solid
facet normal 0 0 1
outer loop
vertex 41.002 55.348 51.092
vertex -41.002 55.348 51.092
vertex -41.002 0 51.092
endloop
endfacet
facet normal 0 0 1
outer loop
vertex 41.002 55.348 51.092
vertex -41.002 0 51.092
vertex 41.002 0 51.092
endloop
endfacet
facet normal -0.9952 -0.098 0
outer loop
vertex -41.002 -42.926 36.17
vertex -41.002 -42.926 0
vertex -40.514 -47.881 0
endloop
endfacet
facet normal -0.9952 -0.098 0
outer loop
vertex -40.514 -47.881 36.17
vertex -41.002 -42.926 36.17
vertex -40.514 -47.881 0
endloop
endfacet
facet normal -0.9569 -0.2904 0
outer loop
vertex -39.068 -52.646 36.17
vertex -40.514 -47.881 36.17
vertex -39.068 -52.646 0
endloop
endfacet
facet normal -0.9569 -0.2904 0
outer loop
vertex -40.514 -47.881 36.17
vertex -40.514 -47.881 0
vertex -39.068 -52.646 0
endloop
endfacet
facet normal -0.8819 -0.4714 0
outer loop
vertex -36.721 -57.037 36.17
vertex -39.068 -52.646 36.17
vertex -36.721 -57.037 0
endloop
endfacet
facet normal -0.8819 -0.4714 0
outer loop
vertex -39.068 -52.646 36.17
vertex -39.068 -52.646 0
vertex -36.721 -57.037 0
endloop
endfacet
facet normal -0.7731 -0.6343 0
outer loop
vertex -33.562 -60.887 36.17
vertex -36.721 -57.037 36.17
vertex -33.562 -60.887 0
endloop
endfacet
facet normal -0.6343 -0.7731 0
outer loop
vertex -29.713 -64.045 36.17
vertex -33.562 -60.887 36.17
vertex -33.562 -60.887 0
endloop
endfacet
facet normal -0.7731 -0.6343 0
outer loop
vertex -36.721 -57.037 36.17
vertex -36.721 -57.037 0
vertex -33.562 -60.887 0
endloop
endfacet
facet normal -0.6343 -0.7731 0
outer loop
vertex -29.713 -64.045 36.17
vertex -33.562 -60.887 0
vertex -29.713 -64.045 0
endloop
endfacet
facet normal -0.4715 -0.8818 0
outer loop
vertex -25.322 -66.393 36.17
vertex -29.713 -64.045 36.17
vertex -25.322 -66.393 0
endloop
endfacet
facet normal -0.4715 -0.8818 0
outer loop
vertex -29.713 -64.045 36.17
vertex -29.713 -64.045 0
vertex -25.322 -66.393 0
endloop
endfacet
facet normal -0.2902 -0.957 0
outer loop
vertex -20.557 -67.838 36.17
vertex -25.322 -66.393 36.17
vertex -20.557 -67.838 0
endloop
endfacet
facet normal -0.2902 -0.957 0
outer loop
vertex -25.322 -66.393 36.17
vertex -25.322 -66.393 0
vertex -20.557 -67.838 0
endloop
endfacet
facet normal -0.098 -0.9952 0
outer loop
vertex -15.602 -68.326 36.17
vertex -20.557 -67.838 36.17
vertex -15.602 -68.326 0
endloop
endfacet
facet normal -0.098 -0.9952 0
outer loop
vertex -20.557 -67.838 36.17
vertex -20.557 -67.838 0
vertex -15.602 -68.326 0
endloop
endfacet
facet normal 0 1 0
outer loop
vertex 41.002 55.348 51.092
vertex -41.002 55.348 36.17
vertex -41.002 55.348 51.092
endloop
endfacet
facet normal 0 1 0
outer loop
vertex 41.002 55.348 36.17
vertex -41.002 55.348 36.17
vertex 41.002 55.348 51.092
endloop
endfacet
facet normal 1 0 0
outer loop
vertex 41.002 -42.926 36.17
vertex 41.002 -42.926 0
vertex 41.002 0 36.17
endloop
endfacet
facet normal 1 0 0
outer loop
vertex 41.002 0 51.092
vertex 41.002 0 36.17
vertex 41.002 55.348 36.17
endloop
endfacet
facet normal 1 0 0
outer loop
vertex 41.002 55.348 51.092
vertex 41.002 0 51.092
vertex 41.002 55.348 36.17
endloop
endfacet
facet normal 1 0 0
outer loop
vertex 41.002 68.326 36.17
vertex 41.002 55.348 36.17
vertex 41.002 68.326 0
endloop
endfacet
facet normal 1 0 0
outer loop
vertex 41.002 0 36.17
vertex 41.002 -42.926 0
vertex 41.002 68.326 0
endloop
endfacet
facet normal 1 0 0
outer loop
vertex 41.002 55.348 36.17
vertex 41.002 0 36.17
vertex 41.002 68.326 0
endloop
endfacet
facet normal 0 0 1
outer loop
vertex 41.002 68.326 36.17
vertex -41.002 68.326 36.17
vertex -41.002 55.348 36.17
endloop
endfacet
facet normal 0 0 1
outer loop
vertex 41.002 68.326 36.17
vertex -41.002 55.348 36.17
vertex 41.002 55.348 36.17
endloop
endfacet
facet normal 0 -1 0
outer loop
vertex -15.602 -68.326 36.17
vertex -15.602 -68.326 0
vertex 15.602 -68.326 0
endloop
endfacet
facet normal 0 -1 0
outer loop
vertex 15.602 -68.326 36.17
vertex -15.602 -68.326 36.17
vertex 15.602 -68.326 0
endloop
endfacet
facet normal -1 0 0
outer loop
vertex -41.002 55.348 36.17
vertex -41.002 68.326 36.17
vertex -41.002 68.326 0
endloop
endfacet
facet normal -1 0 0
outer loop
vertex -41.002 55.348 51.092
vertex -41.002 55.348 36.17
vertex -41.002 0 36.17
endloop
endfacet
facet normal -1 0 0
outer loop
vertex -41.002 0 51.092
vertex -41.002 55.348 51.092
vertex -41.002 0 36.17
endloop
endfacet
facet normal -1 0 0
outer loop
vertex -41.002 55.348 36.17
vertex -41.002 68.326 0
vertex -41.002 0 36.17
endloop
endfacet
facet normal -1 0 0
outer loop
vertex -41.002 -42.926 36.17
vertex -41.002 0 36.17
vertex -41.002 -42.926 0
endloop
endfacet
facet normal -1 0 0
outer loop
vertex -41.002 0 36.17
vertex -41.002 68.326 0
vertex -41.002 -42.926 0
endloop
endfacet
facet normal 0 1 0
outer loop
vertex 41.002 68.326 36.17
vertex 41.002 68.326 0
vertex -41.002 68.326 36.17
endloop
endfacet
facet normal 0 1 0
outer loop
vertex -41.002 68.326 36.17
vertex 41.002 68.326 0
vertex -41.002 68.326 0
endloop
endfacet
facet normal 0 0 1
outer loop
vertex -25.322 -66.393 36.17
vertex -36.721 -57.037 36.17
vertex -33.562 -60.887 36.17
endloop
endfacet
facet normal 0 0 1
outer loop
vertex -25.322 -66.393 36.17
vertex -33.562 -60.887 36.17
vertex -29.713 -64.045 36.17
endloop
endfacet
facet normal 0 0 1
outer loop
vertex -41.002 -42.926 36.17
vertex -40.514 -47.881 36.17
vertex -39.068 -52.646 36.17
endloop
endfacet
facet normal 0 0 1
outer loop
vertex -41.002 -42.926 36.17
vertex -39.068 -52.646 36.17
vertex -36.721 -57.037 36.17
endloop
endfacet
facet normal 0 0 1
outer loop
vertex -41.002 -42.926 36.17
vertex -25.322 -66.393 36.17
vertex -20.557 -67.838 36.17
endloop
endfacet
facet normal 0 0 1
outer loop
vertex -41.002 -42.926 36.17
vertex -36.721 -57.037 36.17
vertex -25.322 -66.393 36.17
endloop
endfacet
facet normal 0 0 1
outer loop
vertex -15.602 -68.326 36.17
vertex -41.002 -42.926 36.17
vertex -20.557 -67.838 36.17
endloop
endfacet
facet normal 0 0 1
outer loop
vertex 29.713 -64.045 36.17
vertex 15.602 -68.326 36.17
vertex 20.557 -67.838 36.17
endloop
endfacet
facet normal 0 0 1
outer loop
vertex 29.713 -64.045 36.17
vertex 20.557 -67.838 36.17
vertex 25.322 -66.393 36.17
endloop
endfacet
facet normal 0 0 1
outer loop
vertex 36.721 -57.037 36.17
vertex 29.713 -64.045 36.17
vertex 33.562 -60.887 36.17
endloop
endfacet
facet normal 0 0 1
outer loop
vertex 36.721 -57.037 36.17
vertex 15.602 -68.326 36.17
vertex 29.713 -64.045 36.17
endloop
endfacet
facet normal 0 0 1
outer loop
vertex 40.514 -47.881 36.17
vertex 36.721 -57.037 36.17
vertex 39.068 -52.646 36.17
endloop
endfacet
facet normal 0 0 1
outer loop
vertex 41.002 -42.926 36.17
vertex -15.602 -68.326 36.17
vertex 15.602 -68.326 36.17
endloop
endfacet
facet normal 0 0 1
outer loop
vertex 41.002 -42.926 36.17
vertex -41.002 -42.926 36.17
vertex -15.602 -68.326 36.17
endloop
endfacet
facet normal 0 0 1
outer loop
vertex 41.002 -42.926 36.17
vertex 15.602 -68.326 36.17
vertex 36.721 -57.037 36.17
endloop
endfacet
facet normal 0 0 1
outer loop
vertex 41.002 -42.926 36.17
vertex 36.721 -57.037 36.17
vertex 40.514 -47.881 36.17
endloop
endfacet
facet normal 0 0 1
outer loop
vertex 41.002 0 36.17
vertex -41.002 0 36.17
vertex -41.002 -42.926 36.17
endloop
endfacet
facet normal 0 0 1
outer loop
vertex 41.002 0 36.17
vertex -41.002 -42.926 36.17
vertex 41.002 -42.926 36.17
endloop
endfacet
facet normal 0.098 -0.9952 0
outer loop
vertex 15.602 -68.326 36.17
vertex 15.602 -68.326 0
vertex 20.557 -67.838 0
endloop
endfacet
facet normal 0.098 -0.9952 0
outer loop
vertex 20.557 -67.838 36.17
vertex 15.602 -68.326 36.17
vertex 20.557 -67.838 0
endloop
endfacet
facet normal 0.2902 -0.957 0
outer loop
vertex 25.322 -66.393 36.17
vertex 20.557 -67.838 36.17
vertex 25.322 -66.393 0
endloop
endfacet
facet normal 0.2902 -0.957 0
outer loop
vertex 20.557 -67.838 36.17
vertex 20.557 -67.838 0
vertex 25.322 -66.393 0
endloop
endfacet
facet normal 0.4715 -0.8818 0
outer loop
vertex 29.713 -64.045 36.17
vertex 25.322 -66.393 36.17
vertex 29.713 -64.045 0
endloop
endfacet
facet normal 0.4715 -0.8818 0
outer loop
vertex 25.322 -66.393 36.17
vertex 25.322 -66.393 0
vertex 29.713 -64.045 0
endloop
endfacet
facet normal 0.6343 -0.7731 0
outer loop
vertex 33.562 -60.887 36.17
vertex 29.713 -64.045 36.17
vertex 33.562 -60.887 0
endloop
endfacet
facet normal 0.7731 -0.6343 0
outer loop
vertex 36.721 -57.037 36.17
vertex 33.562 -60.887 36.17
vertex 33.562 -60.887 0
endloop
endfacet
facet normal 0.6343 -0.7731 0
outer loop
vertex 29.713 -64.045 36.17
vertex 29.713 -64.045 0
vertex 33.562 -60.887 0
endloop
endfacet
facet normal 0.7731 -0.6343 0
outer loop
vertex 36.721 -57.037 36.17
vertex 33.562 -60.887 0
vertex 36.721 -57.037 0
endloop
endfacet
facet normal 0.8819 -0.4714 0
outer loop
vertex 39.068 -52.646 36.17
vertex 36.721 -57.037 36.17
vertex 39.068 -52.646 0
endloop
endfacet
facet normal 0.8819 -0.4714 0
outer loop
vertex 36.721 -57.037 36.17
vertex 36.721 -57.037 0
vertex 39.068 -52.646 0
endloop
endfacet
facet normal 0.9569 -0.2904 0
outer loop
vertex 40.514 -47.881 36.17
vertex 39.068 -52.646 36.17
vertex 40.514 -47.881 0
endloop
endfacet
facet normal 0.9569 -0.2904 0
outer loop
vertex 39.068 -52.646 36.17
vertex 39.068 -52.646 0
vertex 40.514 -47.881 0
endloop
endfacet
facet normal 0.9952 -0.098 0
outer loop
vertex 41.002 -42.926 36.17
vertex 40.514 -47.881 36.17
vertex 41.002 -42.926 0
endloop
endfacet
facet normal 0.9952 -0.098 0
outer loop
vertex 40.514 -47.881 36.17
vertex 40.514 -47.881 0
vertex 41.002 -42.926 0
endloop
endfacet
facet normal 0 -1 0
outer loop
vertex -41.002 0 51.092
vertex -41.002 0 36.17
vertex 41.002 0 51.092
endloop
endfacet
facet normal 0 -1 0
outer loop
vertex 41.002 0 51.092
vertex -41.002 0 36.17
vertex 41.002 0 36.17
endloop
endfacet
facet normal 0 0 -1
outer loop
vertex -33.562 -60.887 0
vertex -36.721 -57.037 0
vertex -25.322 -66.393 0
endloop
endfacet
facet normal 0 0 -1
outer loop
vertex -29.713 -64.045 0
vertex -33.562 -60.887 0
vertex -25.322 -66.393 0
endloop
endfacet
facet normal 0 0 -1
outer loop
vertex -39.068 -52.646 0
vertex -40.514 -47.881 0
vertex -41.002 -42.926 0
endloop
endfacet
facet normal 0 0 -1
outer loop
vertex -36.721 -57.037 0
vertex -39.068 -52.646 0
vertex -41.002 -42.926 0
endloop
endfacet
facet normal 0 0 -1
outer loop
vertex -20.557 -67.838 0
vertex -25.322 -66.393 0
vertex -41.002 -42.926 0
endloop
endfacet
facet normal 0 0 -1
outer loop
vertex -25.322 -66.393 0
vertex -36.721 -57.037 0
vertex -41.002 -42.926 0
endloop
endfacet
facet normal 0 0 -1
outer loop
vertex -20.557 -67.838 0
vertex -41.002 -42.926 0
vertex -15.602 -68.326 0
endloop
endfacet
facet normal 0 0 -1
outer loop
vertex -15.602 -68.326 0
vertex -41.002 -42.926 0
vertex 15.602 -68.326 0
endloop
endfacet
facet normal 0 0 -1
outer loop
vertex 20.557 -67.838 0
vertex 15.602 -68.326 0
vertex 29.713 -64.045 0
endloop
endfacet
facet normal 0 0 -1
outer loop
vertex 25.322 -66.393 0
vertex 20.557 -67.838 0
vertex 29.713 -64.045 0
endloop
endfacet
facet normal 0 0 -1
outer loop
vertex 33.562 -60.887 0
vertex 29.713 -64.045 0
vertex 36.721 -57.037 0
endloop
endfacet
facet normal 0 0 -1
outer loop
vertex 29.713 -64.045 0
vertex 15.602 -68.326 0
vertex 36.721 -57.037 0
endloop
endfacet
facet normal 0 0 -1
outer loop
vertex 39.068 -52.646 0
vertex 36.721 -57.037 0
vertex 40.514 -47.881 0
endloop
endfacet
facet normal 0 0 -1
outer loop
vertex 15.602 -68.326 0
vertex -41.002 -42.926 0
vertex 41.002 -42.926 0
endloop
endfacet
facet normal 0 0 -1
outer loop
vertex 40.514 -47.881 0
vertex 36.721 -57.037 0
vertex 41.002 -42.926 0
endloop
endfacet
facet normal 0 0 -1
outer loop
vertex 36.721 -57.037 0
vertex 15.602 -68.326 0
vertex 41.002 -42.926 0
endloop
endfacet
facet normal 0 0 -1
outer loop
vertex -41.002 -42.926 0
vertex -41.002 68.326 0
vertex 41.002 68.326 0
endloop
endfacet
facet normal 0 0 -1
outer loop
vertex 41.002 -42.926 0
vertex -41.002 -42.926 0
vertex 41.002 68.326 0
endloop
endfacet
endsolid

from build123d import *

# Parameters (mm, degrees)
F1_DEPTH = 36.1696
F2_W     = 82.0039
F2_H     = 55.347547
F3_DEPTH = 14.9225


with BuildPart() as f1:
    # F0 (on Top) → F1 (new body)
    with BuildSketch(Plane.XY):
        with BuildLine():
            Line((-15.60195, -68.326), (15.60195, -68.326))
            ThreePointArc((15.60195, -68.326), (33.562462, -60.886512), (41.00195, -42.926))
            Line((41.00195, -42.926), (41.00195, 68.326))
            Line((41.00195, 68.326), (-41.00195, 68.326))
            Line((-41.00195, 68.326), (-41.00195, -42.926))
            ThreePointArc((-41.00195, -42.926), (-33.562462, -60.886512), (-15.60195, -68.326))
        make_face()
    extrude(amount=F1_DEPTH)

    # F2 (on face) → F3 (join)
    with BuildSketch(Plane.XY.offset(36.1696)):
        with Locations((0, 27.673773)):
            Rectangle(F2_W, F2_H)
    extrude(amount=F3_DEPTH)


solid = f1.part
